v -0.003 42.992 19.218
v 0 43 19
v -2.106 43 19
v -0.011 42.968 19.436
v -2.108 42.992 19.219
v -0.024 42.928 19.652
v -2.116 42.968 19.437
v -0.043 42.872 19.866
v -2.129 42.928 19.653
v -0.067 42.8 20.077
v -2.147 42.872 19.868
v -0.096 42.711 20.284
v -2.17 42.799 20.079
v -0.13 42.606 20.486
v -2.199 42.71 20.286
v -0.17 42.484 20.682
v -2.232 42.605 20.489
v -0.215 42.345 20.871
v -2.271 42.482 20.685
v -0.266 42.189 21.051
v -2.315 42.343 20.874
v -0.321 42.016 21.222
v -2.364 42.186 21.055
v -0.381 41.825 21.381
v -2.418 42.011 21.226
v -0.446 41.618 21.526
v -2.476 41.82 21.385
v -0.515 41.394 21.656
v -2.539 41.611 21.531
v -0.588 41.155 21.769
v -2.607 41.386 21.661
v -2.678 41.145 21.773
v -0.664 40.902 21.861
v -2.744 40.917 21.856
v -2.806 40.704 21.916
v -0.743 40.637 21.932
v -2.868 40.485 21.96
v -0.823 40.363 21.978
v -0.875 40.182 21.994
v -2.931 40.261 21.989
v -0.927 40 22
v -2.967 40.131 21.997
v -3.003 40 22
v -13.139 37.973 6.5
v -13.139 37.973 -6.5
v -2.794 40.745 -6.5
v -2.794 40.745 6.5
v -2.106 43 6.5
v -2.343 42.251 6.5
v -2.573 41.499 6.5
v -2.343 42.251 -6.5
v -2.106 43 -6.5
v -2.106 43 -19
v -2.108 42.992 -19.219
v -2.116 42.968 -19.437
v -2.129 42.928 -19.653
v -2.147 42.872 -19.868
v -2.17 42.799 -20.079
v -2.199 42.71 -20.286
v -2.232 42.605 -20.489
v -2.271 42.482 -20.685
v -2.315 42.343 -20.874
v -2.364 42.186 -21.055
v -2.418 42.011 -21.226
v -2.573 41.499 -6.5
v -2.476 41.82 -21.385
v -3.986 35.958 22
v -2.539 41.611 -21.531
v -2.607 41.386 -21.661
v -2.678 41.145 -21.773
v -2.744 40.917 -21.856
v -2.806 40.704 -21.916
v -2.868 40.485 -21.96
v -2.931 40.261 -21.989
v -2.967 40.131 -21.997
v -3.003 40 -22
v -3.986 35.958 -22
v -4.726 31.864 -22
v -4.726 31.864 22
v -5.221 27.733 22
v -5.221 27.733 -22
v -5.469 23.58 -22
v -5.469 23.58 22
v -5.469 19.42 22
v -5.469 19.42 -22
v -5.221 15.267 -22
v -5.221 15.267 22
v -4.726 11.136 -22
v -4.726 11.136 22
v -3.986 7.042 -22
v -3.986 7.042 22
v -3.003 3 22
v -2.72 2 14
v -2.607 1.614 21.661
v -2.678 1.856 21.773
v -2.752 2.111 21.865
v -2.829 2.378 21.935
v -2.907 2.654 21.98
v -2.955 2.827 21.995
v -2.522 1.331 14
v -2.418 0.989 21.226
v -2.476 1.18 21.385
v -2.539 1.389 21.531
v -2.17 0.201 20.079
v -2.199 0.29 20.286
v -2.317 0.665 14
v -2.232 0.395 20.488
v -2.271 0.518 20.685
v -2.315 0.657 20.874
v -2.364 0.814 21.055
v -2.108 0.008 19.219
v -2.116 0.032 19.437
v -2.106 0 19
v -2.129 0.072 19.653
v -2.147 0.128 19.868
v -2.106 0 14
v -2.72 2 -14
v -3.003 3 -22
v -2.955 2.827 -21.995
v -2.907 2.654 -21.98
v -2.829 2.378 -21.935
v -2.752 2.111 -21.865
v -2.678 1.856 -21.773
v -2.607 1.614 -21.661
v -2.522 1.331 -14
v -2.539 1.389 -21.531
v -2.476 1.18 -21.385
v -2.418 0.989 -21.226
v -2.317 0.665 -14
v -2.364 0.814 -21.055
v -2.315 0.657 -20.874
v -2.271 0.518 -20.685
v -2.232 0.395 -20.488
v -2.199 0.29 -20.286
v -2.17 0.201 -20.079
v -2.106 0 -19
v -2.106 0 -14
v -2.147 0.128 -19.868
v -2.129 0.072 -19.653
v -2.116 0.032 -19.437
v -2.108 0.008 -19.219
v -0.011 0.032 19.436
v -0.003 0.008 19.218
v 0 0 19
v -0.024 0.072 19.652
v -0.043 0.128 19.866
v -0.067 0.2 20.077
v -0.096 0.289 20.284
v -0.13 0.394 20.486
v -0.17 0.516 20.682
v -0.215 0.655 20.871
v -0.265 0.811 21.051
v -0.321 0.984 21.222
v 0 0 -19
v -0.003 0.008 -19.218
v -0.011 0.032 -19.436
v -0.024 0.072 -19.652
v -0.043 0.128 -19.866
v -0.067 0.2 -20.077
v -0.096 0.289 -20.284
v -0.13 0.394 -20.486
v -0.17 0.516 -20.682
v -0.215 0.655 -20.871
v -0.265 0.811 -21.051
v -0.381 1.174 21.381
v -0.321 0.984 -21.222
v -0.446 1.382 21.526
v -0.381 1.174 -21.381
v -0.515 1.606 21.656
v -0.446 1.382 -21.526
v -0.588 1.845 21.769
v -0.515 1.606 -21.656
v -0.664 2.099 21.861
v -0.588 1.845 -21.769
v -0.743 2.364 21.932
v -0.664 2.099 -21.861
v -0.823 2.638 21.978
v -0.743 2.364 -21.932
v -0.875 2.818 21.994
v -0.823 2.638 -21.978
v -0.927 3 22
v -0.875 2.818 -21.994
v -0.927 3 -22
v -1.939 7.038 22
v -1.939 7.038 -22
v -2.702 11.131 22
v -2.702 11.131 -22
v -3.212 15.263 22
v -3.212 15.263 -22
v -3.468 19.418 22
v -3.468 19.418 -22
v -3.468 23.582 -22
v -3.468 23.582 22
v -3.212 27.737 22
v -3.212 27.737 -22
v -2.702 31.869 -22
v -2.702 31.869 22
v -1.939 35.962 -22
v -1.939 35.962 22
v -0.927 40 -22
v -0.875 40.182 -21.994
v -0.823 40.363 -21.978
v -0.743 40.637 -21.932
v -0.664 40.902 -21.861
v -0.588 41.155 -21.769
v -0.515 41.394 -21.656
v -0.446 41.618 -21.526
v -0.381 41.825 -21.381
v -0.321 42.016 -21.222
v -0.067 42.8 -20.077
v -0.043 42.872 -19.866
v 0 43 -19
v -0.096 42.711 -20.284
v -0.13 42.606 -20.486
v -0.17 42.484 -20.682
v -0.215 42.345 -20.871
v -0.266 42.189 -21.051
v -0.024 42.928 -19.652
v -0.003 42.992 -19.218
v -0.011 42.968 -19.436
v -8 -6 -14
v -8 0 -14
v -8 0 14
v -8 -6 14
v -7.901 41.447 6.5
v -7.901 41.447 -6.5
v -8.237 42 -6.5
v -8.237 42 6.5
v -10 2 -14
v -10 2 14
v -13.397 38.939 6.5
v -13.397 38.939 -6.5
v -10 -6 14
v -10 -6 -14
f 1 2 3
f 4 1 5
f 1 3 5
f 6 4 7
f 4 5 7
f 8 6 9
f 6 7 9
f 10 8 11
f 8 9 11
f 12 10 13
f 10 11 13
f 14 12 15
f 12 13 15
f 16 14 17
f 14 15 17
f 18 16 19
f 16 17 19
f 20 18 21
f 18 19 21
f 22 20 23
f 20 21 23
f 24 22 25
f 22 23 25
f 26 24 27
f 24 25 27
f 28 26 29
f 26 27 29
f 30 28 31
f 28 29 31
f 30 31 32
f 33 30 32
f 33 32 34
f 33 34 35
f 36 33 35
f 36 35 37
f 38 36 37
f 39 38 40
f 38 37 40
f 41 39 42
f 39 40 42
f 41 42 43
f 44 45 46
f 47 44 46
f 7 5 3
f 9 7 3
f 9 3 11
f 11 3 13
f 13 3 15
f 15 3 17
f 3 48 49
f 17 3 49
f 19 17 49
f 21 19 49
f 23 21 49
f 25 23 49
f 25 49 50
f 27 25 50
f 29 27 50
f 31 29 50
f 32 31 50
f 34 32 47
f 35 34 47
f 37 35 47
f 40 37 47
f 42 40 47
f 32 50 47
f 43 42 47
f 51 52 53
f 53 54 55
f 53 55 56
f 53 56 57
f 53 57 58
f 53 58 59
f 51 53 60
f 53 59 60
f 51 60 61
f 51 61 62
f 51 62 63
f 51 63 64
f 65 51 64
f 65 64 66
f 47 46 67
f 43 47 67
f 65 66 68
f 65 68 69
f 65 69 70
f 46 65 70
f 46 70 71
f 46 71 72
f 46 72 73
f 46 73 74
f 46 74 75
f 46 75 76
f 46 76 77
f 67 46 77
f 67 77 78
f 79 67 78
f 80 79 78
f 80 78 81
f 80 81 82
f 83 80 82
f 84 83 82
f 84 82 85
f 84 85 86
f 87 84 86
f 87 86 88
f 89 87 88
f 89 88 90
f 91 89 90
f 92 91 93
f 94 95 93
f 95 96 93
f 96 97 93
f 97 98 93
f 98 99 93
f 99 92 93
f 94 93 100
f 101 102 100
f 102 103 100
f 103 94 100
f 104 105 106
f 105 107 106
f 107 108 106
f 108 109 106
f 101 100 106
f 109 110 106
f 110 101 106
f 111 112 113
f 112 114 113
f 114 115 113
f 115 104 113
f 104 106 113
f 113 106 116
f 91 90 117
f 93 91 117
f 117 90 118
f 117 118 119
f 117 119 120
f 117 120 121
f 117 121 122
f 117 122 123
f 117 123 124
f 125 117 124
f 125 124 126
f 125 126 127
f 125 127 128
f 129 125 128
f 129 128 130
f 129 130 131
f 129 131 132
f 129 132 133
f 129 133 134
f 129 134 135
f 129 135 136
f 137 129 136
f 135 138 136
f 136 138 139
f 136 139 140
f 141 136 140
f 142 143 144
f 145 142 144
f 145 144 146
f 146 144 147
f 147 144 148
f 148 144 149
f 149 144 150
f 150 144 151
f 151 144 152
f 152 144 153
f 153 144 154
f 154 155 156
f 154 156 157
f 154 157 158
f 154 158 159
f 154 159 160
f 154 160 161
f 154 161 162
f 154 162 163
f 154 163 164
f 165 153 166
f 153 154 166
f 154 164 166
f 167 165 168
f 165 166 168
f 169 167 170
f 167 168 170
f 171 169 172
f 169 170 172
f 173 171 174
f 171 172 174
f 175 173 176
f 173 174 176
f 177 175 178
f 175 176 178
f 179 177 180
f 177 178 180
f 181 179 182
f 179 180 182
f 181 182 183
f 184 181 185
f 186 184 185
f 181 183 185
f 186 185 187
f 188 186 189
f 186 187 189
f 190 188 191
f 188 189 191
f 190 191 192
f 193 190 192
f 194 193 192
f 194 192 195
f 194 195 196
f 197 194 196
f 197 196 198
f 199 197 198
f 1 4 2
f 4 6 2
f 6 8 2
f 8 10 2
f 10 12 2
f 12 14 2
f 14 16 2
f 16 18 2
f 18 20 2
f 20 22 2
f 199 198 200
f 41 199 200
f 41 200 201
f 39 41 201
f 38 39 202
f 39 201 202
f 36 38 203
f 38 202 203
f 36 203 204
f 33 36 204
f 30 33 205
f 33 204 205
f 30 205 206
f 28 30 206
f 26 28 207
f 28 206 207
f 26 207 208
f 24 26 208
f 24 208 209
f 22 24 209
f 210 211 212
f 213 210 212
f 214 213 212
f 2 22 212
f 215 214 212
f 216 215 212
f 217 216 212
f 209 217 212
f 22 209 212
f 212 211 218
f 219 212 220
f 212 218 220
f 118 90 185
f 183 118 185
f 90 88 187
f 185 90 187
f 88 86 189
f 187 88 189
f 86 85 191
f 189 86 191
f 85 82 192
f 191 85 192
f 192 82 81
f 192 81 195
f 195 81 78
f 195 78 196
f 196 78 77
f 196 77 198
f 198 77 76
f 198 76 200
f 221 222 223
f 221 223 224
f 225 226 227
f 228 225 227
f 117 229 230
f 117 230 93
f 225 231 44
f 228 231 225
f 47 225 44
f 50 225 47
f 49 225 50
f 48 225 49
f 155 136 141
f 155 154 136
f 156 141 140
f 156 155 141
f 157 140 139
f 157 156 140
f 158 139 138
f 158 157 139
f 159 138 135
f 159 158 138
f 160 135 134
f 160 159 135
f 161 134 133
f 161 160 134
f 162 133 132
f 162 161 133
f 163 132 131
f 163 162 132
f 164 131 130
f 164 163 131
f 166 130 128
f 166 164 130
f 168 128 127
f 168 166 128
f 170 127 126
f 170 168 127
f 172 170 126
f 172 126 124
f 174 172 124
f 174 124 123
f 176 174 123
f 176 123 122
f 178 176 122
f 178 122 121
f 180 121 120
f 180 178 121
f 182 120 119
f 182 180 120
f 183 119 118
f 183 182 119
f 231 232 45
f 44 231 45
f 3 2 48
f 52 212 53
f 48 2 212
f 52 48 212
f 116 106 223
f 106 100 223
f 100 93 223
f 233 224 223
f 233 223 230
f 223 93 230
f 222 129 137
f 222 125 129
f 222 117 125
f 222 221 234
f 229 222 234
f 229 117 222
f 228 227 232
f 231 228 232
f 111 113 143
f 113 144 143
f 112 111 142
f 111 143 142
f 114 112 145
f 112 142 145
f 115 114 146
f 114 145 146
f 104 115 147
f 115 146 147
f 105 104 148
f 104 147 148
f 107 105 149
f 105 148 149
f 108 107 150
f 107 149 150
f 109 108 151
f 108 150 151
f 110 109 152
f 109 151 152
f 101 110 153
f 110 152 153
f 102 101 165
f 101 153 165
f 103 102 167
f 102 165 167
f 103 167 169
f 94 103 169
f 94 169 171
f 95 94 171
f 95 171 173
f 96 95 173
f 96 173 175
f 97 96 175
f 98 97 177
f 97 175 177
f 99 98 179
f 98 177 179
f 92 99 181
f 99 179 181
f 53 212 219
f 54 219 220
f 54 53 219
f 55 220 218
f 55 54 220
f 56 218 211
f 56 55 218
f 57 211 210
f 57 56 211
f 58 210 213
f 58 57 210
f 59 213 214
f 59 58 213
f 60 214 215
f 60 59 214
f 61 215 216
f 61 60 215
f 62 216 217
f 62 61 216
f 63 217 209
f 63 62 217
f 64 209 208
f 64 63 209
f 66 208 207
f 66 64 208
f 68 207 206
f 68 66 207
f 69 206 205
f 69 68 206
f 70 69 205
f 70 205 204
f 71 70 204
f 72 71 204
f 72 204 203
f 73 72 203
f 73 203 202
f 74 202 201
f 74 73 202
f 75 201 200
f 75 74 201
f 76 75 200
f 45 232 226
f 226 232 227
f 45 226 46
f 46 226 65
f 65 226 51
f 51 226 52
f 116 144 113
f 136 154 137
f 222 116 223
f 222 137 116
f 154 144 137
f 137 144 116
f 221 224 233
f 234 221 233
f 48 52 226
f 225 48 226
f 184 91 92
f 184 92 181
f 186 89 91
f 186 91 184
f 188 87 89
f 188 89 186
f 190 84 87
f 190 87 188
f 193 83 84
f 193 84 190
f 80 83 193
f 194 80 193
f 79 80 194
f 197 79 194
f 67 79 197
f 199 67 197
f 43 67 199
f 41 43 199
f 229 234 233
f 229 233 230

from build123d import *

# Parameters (mm, degrees)
EXTRUDE_1_DEPTH      = 22
EXTRUDE_1_DEPTH_BACK = 22
FILLET_1_R           = 3
EXTRUDE_2_DEPTH      = 6.5
EXTRUDE_2_DEPTH_BACK = 6.5
EXTRUDE_3_DEPTH      = 14
EXTRUDE_3_DEPTH_BACK = 14


with BuildPart() as part:
    # Эскиз1 → Бобышка-Вытянуть1 (new, two sides: drawn at the far end of the back side and taken through both)
    with BuildSketch(Plane.XY.offset(-EXTRUDE_1_DEPTH_BACK)):
        with BuildLine():
            Line((0, 43), (-2.105519461, 43))
            ThreePointArc((-2.105519461, 43), (-5.5, 21.5), (-2.105519461, 0))
            Line((-2.105519461, 0), (0, 0))
            ThreePointArc((0, 0), (-3.5, 21.5), (0, 43))
        make_face()
    extrude(amount=EXTRUDE_1_DEPTH + EXTRUDE_1_DEPTH_BACK)

    # Скругление1
    fillet_1_edges = [part.edges().sort_by_distance(p)[0] for p in [
        (-1.05275973, 0, -22),
        (-1.05275973, 43, -22),
        (-1.05275973, 0, 22),
        (-1.05275973, 43, 22),
    ]]
    fillet(fillet_1_edges, radius=FILLET_1_R)

    # Эскиз2 → Бобышка-Вытянуть2 (add, two sides: drawn at the far end of the back side and taken through both)
    with BuildSketch(Plane.XY.offset(-EXTRUDE_2_DEPTH_BACK)):
        Polygon((-2.105519461, 43), (-7.901074418, 41.447085729), (-8.237011137, 42), (-13.397493305, 38.939048547), (-13.13867426, 37.973122721), (-2.793911065, 40.744993665), align=None)
    extrude(amount=EXTRUDE_2_DEPTH + EXTRUDE_2_DEPTH_BACK)

    # Эскиз3 → Бобышка-Вытянуть3 (add, two sides: drawn at the far end of the back side and taken through both)
    with BuildSketch(Plane.XY.offset(-EXTRUDE_3_DEPTH_BACK)):
        Polygon((-2.105519461, 0), (-8, 0), (-8, -6), (-10, -6), (-10, 2), (-2.72022514, 2), align=None)
    extrude(amount=EXTRUDE_3_DEPTH + EXTRUDE_3_DEPTH_BACK)


solid = part.part
